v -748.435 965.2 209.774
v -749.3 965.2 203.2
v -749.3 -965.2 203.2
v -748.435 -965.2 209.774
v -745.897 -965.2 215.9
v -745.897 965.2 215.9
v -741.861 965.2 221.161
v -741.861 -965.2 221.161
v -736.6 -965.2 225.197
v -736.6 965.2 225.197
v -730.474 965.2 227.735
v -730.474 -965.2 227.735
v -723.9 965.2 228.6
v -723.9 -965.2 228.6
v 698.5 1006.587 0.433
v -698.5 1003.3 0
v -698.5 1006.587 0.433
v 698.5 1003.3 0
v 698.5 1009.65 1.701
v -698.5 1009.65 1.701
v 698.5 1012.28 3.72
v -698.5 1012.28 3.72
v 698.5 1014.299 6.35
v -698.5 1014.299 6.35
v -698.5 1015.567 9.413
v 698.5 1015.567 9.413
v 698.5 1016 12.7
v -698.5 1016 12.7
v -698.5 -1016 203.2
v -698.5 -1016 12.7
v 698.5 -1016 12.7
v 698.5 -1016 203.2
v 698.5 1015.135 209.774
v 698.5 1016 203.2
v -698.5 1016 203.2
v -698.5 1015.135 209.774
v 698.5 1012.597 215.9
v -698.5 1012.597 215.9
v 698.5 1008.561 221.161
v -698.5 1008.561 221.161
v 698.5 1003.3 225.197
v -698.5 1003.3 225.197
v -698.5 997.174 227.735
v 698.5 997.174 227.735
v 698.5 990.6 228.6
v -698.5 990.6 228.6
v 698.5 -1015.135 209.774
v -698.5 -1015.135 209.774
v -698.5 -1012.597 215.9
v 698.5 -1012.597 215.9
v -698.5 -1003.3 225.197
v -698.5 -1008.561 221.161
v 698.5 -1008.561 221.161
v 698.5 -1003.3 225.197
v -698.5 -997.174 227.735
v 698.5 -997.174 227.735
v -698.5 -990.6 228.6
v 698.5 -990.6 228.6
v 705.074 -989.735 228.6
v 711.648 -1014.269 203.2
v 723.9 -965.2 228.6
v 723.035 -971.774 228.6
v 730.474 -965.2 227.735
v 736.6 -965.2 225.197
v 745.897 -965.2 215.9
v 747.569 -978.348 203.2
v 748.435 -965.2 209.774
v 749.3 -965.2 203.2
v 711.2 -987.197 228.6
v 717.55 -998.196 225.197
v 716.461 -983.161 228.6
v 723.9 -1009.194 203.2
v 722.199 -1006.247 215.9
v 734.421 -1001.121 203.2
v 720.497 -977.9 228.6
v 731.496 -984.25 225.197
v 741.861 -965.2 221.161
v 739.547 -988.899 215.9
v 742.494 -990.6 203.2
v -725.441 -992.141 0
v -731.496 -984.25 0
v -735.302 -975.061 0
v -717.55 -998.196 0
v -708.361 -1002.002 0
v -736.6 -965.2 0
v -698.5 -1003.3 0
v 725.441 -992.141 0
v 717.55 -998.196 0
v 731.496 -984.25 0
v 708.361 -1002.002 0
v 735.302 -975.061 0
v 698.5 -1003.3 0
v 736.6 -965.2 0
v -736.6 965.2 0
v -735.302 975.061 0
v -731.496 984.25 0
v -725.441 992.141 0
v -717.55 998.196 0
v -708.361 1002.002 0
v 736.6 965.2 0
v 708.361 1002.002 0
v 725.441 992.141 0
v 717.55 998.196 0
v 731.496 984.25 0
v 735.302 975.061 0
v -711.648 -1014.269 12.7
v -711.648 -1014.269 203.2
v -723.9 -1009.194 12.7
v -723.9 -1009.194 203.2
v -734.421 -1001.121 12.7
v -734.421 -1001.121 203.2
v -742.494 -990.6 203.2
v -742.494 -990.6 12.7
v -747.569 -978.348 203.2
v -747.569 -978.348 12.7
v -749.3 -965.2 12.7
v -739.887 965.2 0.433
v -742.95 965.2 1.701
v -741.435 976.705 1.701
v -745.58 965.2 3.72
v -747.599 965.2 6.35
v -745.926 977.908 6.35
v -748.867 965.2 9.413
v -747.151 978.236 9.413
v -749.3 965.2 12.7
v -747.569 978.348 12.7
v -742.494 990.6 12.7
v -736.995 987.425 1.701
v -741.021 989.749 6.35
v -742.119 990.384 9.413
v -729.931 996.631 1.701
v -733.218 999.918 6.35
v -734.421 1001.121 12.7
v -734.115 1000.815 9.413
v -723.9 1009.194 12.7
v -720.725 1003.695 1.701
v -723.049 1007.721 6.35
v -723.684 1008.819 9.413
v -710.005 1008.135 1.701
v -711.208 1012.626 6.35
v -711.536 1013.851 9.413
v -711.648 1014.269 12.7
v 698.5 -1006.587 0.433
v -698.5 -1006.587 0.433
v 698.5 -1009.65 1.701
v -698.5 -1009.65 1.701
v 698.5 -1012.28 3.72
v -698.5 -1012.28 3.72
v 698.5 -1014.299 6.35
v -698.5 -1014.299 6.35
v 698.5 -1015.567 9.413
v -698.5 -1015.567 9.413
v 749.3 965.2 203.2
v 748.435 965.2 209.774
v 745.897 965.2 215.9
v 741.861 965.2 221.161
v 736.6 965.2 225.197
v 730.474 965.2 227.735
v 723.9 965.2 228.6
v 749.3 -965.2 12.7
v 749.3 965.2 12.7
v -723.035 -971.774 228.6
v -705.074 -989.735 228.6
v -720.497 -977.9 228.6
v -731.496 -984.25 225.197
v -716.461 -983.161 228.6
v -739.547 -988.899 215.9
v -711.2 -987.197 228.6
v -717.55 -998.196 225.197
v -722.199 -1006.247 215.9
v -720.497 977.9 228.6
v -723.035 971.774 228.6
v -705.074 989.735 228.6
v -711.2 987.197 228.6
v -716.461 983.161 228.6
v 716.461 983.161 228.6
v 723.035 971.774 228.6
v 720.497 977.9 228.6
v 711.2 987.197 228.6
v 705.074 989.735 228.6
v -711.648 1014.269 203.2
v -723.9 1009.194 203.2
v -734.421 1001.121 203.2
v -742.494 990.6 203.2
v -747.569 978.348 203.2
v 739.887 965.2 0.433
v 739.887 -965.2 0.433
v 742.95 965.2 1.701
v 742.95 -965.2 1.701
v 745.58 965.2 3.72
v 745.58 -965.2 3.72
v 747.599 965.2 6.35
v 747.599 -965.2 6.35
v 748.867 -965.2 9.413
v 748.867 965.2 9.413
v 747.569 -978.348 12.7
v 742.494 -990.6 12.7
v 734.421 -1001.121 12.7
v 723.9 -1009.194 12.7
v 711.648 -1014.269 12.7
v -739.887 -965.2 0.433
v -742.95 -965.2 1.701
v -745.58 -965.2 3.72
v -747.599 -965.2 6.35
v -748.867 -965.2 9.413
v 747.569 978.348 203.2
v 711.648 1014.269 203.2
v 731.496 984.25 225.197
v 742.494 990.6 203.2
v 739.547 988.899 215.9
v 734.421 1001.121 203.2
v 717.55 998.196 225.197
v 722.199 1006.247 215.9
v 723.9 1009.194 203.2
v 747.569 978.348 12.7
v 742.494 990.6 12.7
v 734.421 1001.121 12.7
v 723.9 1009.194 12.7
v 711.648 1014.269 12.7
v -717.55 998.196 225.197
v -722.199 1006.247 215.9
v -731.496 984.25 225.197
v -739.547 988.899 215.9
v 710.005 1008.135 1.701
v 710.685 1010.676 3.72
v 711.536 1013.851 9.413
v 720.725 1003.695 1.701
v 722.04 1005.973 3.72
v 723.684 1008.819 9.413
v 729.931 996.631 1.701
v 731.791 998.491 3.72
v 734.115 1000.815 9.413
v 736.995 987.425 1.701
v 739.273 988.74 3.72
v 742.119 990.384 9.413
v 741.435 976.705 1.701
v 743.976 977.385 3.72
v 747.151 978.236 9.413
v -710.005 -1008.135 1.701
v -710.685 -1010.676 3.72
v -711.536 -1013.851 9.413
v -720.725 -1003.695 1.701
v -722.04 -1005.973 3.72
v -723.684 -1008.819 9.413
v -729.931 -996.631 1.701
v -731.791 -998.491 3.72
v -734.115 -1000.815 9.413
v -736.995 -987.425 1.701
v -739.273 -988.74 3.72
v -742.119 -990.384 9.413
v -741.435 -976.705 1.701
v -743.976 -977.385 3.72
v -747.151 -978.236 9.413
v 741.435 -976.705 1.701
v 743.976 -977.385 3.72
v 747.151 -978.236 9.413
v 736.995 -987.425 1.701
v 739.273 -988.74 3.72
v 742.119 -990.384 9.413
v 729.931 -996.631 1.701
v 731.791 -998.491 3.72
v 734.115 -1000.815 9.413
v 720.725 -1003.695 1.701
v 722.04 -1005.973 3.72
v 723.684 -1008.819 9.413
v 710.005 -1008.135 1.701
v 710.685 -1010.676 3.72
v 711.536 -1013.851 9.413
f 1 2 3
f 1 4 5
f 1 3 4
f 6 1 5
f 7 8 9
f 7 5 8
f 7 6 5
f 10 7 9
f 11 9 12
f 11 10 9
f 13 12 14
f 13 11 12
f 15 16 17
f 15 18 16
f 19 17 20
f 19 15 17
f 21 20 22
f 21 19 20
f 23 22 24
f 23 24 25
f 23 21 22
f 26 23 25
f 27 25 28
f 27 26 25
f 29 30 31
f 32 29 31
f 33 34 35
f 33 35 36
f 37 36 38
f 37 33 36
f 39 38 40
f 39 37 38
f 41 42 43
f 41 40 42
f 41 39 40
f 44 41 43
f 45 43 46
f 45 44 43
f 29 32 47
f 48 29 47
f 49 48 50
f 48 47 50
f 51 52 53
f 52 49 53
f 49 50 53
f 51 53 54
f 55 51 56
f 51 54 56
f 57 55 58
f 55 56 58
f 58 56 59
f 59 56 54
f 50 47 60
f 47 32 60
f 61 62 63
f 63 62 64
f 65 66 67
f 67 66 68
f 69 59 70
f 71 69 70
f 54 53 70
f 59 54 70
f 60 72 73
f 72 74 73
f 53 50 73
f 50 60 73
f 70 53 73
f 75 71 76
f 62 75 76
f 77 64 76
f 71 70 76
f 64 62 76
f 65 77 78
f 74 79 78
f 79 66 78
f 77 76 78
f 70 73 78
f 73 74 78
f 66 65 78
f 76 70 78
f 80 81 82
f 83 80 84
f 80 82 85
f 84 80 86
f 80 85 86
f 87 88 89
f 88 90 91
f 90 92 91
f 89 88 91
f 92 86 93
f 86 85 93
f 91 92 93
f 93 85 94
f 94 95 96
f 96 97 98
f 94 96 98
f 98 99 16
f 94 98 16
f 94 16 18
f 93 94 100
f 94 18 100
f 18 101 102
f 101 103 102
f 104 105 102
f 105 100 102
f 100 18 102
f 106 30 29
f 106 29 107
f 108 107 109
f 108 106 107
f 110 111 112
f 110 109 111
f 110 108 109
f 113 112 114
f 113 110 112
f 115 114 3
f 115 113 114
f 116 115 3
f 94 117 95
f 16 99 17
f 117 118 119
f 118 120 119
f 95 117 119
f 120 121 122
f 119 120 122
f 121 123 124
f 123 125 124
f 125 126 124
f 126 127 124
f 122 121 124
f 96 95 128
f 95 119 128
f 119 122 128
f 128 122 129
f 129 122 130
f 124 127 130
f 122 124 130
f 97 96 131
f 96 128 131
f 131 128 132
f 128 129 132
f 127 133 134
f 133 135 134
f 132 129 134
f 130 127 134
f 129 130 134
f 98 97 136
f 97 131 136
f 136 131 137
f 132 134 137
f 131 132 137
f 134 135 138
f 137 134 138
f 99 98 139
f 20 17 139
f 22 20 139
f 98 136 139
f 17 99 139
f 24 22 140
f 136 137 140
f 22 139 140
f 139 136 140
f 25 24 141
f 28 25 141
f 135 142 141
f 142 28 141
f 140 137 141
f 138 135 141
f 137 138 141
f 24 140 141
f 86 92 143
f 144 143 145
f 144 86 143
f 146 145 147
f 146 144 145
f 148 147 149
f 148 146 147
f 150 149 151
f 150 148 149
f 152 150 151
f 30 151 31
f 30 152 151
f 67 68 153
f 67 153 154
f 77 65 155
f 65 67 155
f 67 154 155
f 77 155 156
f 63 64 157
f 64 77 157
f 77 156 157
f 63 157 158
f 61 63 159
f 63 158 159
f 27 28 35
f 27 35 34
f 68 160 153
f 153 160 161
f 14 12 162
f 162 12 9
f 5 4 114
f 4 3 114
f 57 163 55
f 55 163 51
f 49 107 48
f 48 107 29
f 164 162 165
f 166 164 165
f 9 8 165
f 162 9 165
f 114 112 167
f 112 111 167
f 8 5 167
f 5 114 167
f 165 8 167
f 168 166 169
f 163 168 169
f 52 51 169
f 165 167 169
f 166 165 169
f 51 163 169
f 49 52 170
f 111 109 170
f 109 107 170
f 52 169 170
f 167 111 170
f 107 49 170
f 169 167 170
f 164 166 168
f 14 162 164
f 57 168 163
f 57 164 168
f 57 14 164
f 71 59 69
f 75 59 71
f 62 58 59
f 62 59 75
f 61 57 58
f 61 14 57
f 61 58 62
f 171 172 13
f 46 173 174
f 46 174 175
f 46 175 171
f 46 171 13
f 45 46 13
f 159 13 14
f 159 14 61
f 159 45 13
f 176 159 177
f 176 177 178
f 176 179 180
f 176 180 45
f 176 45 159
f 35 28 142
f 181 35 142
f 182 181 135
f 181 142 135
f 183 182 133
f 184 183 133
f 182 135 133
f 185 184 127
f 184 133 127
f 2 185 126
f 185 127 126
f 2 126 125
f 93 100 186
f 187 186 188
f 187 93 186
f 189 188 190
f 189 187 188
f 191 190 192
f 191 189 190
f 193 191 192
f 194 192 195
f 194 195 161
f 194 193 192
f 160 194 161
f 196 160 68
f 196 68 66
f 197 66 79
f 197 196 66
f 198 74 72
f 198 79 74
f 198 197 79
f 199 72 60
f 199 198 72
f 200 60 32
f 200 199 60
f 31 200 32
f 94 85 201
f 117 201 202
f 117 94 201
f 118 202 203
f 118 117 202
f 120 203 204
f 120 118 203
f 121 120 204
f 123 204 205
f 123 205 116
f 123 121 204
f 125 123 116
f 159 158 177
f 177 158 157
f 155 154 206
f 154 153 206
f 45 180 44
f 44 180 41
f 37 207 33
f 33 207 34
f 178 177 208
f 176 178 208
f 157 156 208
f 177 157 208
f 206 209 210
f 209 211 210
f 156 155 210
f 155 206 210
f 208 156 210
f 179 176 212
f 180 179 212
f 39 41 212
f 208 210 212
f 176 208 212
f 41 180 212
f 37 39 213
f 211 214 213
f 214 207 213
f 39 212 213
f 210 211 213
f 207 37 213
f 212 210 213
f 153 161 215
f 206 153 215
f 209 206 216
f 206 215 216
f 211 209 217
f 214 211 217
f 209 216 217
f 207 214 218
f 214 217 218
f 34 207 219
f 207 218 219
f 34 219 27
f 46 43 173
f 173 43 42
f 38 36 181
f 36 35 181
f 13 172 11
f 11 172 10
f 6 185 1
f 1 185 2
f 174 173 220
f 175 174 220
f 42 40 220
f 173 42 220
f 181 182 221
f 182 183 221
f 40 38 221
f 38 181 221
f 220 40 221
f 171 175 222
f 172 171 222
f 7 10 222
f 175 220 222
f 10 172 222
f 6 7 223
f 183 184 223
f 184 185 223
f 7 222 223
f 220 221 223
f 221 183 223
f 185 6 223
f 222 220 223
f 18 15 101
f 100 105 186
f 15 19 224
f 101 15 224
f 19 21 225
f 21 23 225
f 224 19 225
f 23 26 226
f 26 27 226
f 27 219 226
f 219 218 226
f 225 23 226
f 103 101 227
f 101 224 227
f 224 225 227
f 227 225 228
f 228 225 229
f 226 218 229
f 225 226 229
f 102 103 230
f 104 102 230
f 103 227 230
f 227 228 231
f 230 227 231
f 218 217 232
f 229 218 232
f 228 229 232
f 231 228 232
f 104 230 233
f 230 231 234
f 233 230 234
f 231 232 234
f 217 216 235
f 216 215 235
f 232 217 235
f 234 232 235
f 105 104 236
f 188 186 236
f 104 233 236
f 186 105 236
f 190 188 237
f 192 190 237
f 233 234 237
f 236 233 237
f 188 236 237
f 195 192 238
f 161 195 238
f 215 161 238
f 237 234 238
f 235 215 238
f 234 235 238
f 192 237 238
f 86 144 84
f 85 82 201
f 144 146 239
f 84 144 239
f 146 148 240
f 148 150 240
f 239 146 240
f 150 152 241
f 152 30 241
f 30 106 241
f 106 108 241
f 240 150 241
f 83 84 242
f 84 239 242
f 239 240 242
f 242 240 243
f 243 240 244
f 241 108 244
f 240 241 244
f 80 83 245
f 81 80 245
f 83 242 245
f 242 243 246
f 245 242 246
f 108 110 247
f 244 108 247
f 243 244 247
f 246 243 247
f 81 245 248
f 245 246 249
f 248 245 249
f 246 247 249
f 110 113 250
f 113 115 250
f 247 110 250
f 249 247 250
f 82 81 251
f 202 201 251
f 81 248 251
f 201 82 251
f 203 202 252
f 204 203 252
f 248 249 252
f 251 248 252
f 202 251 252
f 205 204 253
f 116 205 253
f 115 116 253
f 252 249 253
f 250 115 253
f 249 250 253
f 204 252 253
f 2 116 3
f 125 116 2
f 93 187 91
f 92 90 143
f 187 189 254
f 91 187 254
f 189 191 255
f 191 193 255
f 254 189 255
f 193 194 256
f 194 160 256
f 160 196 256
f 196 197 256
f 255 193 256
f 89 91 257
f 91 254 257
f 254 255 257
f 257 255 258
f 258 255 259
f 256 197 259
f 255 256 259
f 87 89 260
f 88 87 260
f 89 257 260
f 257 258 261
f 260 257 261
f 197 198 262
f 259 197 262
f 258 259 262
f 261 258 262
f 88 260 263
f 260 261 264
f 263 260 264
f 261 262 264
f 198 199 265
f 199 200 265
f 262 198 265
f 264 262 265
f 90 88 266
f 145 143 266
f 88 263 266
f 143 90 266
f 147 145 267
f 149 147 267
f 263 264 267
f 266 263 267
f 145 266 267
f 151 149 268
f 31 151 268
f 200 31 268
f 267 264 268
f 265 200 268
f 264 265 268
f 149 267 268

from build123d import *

# Parameters (mm, degrees)
F0_W         = 1498.6
F0_H         = 2032
F1_DEPTH     = 228.6
F2_R         = 25.4
F3_T1_DEPTH  = 355.6
F3_T4_ANGLE  = 90
F3_T6_ANGLE  = 90
F3_T8_ANGLE  = 90
F3_T10_ANGLE = 90
F4_R         = 12.7


# Not quite as in the source:
# - a fillet or chamfer that OpenCascade refuses, or shapes differently, is made with other operations: its cross-section is extruded or revolved along the edge and cut away or added


with BuildPart() as f1:
    # F0 (on Top) → F1 (new body)
    with BuildSketch(Plane.XY):
        Rectangle(F0_W, F0_H)
    extrude(amount=F1_DEPTH)

    # F2
    f2_edges = [f1.edges().sort_by_distance(p)[0] for p in [
        (-749.3, 0, 228.6),
        (0, -1016, 228.6),
        (749.3, 0, 228.6),
        (0, 1016, 228.6),
    ]]
    fillet(f2_edges, radius=F2_R)

    # F3: fillet of radius 50.8 on 4 edges, made by hand

    # F3_s2 → F3_t1 (cut)
    with BuildSketch(Plane.XY.offset(-127)):
        with BuildLine():
            ThreePointArc((-698.5, -1016), (-734.4210244843, -1001.1210244843), (-749.3, -965.2))
            Line((-749.3, -965.2), (-749.3, -1016))
            Line((-749.3, -1016), (-698.5, -1016))
        make_face()
        with BuildLine():
            ThreePointArc((749.3, -965.2), (734.4210244843, -1001.1210244843), (698.5, -1016))
            Line((698.5, -1016), (749.3, -1016))
            Line((749.3, -1016), (749.3, -965.2))
        make_face()
        with BuildLine():
            ThreePointArc((-698.5, 1016), (-734.4210244843, 1001.1210244843), (-749.3, 965.2))
            Line((-749.3, 965.2), (-749.3, 1016))
            Line((-749.3, 1016), (-698.5, 1016))
        make_face()
        with BuildLine():
            ThreePointArc((749.3, 965.2), (734.4210244843, 1001.1210244843), (698.5, 1016))
            Line((698.5, 1016), (749.3, 1016))
            Line((749.3, 1016), (749.3, 965.2))
        make_face()
    extrude(amount=F3_T1_DEPTH, mode=Mode.SUBTRACT)

    # F3_s3 → F3_t4 (revolve, cut)
    with BuildSketch(Plane.XZ.offset(-965.2)):
        with BuildLine():
            ThreePointArc((723.9, 228.6), (741.8605122421, 221.1605122421), (749.3, 203.2))
            Line((749.3, 203.2), (749.3, 228.6))
            Line((749.3, 228.6), (723.9, 228.6))
        make_face()
    revolve(axis=Axis((698.5, 965.2, 228.6), (0, 0, 1)), revolution_arc=F3_T4_ANGLE, mode=Mode.SUBTRACT)

    # F3_s5 → F3_t6 (revolve, cut)
    with BuildSketch(Plane.YZ.offset(-698.5)):
        with BuildLine():
            ThreePointArc((990.6, 228.6), (1008.5605122421, 221.1605122421), (1016, 203.2))
            Line((1016, 203.2), (1016, 228.6))
            Line((1016, 228.6), (990.6, 228.6))
        make_face()
    revolve(axis=Axis((-698.5, 965.2, 228.6), (0, 0, 1)), revolution_arc=F3_T6_ANGLE, mode=Mode.SUBTRACT)

    # F3_s7 → F3_t8 (revolve, cut)
    with BuildSketch(Plane.YZ.offset(698.5)):
        with BuildLine():
            ThreePointArc((-990.6, 228.6), (-1008.5605122421, 221.1605122421), (-1016, 203.2))
            Line((-1016, 203.2), (-1016, 228.6))
            Line((-1016, 228.6), (-990.6, 228.6))
        make_face()
    revolve(axis=Axis((698.5, -965.2, 228.6), (0, 0, 1)), revolution_arc=F3_T8_ANGLE, mode=Mode.SUBTRACT)

    # F3_s9 → F3_t10 (revolve, cut)
    with BuildSketch(Plane.XZ.offset(965.2)):
        with BuildLine():
            ThreePointArc((-723.9, 228.6), (-741.8605122421, 221.1605122421), (-749.3, 203.2))
            Line((-749.3, 203.2), (-749.3, 228.6))
            Line((-749.3, 228.6), (-723.9, 228.6))
        make_face()
    revolve(axis=Axis((-698.5, -965.2, 228.6), (0, 0, 1)), revolution_arc=F3_T10_ANGLE, mode=Mode.SUBTRACT)

    # F4
    f4_edges = [f1.edges().sort_by_distance(p)[0] for p in [
        (0, 1016, 0),
        (-749.3, 0, 0),
        (0, -1016, 0),
    ]]
    fillet(f4_edges, radius=F4_R)


solid = f1.part
